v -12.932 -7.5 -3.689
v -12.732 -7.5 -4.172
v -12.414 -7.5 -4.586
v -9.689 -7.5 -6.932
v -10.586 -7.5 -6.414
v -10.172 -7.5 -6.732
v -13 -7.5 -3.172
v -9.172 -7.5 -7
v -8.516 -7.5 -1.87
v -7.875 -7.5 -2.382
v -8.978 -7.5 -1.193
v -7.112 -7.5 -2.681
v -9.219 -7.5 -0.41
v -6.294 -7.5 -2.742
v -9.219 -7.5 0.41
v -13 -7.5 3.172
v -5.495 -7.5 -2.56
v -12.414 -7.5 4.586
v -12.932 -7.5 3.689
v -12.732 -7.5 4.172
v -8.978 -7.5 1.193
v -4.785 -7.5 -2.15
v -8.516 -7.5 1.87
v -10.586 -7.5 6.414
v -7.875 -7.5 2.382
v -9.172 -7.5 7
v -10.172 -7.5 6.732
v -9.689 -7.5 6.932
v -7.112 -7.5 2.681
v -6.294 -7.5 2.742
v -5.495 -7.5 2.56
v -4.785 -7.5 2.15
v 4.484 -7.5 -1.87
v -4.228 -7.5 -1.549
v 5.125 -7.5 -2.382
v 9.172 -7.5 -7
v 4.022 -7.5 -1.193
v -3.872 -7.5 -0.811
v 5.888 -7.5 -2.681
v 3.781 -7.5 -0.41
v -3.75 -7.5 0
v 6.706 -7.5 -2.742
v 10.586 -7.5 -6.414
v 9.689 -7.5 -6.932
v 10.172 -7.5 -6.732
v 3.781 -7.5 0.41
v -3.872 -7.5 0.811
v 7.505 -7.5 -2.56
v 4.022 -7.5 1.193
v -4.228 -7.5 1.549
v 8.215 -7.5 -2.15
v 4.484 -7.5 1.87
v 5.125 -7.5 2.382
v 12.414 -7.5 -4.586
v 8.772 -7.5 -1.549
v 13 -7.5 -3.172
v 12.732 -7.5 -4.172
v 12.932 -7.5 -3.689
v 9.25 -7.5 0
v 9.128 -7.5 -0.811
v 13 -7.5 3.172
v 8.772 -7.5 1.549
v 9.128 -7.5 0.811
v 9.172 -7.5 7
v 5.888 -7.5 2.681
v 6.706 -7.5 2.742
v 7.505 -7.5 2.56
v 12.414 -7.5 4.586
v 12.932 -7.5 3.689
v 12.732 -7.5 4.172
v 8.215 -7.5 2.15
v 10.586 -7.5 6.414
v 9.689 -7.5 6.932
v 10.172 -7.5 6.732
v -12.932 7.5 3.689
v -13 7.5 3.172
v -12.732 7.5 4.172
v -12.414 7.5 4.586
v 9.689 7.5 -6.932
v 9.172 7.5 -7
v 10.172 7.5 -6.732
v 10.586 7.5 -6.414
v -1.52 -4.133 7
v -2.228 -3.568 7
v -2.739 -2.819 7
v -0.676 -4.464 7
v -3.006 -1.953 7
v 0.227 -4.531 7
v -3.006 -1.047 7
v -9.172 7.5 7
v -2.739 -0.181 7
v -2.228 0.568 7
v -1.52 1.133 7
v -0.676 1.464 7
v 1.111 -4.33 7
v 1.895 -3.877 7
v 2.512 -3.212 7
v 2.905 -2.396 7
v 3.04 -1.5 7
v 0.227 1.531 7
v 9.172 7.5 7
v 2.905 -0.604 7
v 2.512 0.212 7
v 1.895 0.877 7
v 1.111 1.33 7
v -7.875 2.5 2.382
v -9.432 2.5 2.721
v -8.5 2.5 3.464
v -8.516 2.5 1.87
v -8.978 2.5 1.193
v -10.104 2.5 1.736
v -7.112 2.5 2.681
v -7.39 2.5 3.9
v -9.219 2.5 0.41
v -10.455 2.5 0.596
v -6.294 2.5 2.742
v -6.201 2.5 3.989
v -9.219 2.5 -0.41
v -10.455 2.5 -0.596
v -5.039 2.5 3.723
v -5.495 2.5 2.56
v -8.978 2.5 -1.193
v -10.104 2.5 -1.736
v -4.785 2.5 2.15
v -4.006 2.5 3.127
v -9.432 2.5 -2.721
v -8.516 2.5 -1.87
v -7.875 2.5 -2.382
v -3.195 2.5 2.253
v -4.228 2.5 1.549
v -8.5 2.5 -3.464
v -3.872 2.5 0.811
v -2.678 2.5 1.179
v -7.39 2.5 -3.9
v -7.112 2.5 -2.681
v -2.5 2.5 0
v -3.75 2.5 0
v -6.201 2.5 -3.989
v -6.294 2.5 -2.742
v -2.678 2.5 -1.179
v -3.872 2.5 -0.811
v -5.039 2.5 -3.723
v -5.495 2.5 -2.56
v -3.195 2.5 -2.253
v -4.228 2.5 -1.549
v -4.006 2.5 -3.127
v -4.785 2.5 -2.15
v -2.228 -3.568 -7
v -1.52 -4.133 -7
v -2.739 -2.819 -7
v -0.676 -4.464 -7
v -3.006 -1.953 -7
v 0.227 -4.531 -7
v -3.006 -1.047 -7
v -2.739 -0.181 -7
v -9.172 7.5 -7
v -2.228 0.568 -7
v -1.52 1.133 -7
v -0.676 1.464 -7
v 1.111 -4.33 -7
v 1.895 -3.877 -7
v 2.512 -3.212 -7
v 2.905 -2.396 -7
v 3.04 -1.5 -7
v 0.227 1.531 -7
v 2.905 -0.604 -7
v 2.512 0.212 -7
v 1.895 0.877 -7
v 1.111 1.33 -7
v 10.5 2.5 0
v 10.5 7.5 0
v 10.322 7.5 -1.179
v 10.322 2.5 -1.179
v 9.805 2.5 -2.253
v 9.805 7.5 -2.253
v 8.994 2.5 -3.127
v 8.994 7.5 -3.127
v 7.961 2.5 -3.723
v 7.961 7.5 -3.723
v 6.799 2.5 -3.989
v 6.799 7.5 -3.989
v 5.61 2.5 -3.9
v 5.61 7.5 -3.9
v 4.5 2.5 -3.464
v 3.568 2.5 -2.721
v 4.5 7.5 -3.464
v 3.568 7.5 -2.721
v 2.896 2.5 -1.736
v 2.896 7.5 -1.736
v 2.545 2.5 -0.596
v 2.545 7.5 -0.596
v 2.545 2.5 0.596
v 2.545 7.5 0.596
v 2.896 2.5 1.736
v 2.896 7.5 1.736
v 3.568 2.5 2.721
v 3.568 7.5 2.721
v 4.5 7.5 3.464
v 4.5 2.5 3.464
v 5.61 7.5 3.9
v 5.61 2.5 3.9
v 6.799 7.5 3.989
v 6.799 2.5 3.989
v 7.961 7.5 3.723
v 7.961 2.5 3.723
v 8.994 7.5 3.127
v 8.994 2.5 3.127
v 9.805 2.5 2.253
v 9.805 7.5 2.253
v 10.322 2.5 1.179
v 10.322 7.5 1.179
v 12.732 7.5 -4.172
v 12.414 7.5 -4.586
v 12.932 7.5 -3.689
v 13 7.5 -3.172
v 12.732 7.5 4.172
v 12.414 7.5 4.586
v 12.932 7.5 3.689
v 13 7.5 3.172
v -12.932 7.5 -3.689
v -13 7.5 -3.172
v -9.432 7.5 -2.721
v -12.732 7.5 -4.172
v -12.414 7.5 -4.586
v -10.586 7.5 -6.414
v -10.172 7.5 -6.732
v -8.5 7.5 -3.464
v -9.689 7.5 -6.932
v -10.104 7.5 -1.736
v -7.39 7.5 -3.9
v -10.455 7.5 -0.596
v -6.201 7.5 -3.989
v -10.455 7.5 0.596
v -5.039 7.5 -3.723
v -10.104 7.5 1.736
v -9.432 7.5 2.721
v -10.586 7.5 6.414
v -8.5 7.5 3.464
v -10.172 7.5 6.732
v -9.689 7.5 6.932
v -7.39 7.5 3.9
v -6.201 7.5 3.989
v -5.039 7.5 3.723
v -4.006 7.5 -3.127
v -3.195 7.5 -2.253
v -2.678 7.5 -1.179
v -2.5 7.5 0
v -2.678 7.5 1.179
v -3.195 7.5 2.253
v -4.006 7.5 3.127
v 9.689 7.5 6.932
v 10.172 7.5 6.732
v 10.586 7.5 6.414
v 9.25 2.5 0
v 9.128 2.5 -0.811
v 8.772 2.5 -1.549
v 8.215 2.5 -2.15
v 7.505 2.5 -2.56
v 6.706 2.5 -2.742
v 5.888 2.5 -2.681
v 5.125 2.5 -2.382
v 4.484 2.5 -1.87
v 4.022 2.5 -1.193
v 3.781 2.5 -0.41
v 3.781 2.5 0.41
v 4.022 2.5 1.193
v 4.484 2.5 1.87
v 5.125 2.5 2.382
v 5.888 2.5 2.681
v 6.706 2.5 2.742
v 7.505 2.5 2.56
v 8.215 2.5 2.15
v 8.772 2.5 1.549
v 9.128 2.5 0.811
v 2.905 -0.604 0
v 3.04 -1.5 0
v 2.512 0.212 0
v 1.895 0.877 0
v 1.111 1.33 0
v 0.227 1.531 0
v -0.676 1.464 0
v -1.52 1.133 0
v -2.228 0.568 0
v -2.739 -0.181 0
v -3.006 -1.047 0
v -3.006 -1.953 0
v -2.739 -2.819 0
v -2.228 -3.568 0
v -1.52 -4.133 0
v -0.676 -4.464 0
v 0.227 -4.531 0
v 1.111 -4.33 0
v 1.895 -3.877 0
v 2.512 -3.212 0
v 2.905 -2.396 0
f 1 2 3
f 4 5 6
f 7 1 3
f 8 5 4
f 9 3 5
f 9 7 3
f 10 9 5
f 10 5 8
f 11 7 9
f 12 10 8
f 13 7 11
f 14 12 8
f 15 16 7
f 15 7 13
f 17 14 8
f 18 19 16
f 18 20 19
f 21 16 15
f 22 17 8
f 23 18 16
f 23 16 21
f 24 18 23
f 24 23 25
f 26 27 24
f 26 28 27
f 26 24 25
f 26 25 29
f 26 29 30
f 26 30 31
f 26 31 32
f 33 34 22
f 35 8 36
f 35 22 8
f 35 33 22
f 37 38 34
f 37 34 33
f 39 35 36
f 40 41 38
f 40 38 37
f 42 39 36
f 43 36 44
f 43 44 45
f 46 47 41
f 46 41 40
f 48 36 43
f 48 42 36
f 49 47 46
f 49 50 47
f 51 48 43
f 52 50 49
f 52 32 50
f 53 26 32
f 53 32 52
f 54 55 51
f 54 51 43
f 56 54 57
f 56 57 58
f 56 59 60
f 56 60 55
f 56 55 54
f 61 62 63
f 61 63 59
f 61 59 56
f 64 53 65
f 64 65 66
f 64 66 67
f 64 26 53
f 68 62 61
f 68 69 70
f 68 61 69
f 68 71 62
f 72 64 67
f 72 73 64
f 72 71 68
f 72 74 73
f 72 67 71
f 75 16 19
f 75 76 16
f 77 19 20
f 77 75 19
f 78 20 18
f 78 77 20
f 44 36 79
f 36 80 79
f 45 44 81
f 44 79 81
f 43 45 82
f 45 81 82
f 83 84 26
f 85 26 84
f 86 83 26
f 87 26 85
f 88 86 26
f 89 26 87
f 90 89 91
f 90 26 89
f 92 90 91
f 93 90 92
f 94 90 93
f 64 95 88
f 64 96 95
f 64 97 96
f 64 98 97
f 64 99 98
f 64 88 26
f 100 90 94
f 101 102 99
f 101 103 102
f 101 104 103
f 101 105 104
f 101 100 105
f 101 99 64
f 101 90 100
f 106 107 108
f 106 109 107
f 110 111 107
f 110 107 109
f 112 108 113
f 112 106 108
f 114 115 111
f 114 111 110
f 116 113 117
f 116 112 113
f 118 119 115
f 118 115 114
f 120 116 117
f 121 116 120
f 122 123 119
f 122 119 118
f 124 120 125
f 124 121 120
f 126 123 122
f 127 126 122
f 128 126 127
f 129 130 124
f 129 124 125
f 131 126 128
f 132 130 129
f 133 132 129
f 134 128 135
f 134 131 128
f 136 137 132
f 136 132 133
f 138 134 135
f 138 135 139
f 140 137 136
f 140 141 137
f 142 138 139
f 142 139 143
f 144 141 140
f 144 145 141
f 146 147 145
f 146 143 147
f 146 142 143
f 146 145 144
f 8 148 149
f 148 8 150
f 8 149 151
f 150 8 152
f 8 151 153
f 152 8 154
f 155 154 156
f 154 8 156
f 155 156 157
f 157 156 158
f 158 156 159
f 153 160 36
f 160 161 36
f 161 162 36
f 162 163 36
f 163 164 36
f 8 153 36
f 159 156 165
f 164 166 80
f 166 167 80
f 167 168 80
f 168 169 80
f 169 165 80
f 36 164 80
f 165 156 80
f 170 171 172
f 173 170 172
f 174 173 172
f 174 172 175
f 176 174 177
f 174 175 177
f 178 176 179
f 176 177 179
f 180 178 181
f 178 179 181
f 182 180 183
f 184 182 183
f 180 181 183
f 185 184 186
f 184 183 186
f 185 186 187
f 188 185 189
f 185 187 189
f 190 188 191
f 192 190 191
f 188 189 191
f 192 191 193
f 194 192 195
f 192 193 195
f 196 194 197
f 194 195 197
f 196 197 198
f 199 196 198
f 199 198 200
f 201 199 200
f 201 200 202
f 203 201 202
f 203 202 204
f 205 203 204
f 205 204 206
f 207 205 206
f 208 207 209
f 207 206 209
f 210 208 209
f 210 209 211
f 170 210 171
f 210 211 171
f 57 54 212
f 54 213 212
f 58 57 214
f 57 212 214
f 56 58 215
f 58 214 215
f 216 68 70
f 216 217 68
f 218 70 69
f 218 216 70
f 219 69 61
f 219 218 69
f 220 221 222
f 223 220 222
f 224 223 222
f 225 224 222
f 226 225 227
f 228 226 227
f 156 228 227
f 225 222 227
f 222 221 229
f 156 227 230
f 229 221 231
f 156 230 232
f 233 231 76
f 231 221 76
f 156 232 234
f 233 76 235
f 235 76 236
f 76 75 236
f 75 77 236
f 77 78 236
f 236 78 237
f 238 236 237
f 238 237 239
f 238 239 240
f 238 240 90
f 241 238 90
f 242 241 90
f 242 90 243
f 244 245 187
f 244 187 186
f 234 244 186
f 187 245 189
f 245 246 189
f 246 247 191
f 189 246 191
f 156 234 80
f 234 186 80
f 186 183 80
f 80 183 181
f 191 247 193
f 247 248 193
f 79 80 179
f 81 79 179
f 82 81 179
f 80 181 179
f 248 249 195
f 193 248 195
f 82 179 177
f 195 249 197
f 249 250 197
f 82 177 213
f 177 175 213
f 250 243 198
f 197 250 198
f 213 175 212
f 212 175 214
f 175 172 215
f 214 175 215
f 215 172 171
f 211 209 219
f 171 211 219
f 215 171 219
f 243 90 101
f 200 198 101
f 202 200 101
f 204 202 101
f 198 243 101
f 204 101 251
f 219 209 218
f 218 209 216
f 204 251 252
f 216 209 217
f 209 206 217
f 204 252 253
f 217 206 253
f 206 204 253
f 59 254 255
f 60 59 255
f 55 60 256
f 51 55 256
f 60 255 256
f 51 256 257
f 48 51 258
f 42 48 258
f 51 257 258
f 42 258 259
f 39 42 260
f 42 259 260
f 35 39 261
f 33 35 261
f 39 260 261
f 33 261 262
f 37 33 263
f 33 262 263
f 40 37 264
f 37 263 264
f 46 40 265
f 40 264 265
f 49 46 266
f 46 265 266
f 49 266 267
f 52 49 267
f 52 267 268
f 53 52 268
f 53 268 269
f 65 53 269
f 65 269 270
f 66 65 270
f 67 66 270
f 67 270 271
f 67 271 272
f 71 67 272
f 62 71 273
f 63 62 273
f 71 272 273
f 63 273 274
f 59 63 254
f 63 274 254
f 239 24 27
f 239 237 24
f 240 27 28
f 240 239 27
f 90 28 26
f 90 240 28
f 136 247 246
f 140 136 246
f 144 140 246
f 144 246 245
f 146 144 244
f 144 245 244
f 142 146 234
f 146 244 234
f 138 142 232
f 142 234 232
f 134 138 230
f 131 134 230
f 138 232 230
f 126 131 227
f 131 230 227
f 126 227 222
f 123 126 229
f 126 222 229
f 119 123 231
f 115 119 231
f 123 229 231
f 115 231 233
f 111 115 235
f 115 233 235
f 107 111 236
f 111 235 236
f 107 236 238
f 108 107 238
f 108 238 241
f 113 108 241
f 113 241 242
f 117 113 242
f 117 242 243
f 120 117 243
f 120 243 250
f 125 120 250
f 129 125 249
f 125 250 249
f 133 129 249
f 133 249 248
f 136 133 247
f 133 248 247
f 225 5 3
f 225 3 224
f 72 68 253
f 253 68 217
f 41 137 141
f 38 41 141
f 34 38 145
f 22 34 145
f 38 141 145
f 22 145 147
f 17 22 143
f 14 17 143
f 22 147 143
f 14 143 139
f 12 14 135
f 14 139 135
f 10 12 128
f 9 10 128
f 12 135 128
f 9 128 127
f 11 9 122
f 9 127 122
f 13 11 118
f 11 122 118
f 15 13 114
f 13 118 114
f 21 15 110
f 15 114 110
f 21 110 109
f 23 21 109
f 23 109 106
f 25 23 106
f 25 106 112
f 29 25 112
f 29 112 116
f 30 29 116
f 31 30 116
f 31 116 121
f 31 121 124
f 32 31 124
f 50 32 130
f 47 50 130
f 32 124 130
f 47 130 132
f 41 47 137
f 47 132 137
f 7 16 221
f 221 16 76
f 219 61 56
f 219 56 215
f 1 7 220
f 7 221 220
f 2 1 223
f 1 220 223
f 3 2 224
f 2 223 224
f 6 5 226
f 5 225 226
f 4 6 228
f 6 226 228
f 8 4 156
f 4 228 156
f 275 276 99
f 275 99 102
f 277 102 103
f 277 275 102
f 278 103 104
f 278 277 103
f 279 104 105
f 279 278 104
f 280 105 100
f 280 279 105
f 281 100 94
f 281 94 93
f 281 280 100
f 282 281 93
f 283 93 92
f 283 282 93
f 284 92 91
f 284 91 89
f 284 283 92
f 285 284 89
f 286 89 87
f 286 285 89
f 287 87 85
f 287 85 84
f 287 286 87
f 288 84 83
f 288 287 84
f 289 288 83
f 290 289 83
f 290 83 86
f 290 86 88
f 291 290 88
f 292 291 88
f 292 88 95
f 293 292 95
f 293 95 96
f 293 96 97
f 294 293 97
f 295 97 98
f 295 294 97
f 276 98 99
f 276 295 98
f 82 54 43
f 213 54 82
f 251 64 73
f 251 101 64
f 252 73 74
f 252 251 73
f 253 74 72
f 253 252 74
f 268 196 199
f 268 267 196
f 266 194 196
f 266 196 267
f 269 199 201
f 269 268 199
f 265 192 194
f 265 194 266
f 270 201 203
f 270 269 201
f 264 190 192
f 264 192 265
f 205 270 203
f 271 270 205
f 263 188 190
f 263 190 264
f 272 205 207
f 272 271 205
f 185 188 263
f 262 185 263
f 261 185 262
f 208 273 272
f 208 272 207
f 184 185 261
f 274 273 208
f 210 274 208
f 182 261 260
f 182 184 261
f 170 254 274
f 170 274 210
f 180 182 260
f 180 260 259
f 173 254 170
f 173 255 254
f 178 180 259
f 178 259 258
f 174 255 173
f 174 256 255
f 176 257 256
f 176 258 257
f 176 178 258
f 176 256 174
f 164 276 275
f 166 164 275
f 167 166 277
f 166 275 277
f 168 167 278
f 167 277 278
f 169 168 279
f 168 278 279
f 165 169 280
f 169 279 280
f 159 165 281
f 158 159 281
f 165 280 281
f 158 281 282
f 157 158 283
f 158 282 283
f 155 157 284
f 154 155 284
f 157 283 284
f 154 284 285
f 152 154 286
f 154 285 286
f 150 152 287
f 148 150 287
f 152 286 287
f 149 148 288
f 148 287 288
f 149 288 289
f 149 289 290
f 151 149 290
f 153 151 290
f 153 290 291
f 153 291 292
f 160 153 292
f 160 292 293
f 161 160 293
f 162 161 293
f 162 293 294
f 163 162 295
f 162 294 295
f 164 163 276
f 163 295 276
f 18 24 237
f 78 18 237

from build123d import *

# Parameters (mm, degrees)
BOSS_EXTRUDE1_DEPTH      = 7
BOSS_EXTRUDE1_DEPTH_BACK = 7
SKETCH1_W                = 26
SKETCH1_H                = 15
CUT_EXTRUDE1_DEPTH       = 7
CUT_EXTRUDE1_DEPTH_BACK  = 7
SKETCH3_R                = 3.04
SKETCH4_R                = 4
CUT_EXTRUDE2_DEPTH       = 5
CHAMFER1_SIZE            = 3
FILLET1_R                = 2
ESQUISSE1_R              = 2.75
ENL_V_MAT_EXTRU_1_DEPTH  = 10
ESQUISSE2_R              = 2.75
ENL_V_MAT_EXTRU_2_DEPTH  = 10


with BuildPart() as part:
    # Sketch1 → Boss-Extrude1 (new, two sides: drawn at the far end of the back side and taken through both)
    with BuildSketch(Plane.XY.offset(-BOSS_EXTRUDE1_DEPTH_BACK)):
        Rectangle(SKETCH1_W, SKETCH1_H)
    extrude(amount=BOSS_EXTRUDE1_DEPTH + BOSS_EXTRUDE1_DEPTH_BACK)

    # Sketch3 → Cut-Extrude1 (cut, two sides: drawn at the far end of the back side and taken through both)
    with BuildSketch(Plane.XY.offset(-CUT_EXTRUDE1_DEPTH_BACK)):
        with Locations((0, -1.5)):
            Circle(SKETCH3_R)
    extrude(amount=CUT_EXTRUDE1_DEPTH + CUT_EXTRUDE1_DEPTH_BACK, mode=Mode.SUBTRACT)

    # Sketch4 → Cut-Extrude2 (cut)
    with BuildSketch(Plane(origin=(0, 7.5, 0), x_dir=(1, 0, 0), z_dir=(0, 1, 0))):
        with Locations((-6.5, 0)):
            Circle(SKETCH4_R)
        with Locations((6.5, 0)):
            Circle(SKETCH4_R)
    extrude(amount=-CUT_EXTRUDE2_DEPTH, mode=Mode.SUBTRACT)

    # Chamfer1
    chamfer1_edges = [part.edges().sort_by_distance(p)[0] for p in [
        (13, 0, -7),
        (13, 0, 7),
        (-13, 0, -7),
        (-13, 0, 7),
    ]]
    chamfer(chamfer1_edges, length=CHAMFER1_SIZE)

    # Fillet1
    fillet1_edges = [part.edges().sort_by_distance(p)[0] for p in [
        (-10, 0, -7),
        (-13, 0, -4),
        (10, 0, -7),
        (13, 0, -4),
        (13, 0, 4),
        (10, 0, 7),
        (-13, 0, 4),
        (-10, 0, 7),
    ]]
    fillet(fillet1_edges, radius=FILLET1_R)

    # Esquisse1 → Enlèv. mat.-Extru.1 (cut)
    with BuildSketch(Plane(origin=(0, 2.5, 0), x_dir=(1, 0, 0), z_dir=(0, 1, 0))):
        with Locations((6.5, 0)):
            Circle(ESQUISSE1_R)
    extrude(amount=-ENL_V_MAT_EXTRU_1_DEPTH, mode=Mode.SUBTRACT)

    # Esquisse2 → Enlèv. mat.-Extru.2 (cut)
    with BuildSketch(Plane(origin=(0, 2.5, 0), x_dir=(1, 0, 0), z_dir=(0, 1, 0))):
        with Locations((-6.5, 0)):
            Circle(ESQUISSE2_R)
    extrude(amount=-ENL_V_MAT_EXTRU_2_DEPTH, mode=Mode.SUBTRACT)


solid = part.part
